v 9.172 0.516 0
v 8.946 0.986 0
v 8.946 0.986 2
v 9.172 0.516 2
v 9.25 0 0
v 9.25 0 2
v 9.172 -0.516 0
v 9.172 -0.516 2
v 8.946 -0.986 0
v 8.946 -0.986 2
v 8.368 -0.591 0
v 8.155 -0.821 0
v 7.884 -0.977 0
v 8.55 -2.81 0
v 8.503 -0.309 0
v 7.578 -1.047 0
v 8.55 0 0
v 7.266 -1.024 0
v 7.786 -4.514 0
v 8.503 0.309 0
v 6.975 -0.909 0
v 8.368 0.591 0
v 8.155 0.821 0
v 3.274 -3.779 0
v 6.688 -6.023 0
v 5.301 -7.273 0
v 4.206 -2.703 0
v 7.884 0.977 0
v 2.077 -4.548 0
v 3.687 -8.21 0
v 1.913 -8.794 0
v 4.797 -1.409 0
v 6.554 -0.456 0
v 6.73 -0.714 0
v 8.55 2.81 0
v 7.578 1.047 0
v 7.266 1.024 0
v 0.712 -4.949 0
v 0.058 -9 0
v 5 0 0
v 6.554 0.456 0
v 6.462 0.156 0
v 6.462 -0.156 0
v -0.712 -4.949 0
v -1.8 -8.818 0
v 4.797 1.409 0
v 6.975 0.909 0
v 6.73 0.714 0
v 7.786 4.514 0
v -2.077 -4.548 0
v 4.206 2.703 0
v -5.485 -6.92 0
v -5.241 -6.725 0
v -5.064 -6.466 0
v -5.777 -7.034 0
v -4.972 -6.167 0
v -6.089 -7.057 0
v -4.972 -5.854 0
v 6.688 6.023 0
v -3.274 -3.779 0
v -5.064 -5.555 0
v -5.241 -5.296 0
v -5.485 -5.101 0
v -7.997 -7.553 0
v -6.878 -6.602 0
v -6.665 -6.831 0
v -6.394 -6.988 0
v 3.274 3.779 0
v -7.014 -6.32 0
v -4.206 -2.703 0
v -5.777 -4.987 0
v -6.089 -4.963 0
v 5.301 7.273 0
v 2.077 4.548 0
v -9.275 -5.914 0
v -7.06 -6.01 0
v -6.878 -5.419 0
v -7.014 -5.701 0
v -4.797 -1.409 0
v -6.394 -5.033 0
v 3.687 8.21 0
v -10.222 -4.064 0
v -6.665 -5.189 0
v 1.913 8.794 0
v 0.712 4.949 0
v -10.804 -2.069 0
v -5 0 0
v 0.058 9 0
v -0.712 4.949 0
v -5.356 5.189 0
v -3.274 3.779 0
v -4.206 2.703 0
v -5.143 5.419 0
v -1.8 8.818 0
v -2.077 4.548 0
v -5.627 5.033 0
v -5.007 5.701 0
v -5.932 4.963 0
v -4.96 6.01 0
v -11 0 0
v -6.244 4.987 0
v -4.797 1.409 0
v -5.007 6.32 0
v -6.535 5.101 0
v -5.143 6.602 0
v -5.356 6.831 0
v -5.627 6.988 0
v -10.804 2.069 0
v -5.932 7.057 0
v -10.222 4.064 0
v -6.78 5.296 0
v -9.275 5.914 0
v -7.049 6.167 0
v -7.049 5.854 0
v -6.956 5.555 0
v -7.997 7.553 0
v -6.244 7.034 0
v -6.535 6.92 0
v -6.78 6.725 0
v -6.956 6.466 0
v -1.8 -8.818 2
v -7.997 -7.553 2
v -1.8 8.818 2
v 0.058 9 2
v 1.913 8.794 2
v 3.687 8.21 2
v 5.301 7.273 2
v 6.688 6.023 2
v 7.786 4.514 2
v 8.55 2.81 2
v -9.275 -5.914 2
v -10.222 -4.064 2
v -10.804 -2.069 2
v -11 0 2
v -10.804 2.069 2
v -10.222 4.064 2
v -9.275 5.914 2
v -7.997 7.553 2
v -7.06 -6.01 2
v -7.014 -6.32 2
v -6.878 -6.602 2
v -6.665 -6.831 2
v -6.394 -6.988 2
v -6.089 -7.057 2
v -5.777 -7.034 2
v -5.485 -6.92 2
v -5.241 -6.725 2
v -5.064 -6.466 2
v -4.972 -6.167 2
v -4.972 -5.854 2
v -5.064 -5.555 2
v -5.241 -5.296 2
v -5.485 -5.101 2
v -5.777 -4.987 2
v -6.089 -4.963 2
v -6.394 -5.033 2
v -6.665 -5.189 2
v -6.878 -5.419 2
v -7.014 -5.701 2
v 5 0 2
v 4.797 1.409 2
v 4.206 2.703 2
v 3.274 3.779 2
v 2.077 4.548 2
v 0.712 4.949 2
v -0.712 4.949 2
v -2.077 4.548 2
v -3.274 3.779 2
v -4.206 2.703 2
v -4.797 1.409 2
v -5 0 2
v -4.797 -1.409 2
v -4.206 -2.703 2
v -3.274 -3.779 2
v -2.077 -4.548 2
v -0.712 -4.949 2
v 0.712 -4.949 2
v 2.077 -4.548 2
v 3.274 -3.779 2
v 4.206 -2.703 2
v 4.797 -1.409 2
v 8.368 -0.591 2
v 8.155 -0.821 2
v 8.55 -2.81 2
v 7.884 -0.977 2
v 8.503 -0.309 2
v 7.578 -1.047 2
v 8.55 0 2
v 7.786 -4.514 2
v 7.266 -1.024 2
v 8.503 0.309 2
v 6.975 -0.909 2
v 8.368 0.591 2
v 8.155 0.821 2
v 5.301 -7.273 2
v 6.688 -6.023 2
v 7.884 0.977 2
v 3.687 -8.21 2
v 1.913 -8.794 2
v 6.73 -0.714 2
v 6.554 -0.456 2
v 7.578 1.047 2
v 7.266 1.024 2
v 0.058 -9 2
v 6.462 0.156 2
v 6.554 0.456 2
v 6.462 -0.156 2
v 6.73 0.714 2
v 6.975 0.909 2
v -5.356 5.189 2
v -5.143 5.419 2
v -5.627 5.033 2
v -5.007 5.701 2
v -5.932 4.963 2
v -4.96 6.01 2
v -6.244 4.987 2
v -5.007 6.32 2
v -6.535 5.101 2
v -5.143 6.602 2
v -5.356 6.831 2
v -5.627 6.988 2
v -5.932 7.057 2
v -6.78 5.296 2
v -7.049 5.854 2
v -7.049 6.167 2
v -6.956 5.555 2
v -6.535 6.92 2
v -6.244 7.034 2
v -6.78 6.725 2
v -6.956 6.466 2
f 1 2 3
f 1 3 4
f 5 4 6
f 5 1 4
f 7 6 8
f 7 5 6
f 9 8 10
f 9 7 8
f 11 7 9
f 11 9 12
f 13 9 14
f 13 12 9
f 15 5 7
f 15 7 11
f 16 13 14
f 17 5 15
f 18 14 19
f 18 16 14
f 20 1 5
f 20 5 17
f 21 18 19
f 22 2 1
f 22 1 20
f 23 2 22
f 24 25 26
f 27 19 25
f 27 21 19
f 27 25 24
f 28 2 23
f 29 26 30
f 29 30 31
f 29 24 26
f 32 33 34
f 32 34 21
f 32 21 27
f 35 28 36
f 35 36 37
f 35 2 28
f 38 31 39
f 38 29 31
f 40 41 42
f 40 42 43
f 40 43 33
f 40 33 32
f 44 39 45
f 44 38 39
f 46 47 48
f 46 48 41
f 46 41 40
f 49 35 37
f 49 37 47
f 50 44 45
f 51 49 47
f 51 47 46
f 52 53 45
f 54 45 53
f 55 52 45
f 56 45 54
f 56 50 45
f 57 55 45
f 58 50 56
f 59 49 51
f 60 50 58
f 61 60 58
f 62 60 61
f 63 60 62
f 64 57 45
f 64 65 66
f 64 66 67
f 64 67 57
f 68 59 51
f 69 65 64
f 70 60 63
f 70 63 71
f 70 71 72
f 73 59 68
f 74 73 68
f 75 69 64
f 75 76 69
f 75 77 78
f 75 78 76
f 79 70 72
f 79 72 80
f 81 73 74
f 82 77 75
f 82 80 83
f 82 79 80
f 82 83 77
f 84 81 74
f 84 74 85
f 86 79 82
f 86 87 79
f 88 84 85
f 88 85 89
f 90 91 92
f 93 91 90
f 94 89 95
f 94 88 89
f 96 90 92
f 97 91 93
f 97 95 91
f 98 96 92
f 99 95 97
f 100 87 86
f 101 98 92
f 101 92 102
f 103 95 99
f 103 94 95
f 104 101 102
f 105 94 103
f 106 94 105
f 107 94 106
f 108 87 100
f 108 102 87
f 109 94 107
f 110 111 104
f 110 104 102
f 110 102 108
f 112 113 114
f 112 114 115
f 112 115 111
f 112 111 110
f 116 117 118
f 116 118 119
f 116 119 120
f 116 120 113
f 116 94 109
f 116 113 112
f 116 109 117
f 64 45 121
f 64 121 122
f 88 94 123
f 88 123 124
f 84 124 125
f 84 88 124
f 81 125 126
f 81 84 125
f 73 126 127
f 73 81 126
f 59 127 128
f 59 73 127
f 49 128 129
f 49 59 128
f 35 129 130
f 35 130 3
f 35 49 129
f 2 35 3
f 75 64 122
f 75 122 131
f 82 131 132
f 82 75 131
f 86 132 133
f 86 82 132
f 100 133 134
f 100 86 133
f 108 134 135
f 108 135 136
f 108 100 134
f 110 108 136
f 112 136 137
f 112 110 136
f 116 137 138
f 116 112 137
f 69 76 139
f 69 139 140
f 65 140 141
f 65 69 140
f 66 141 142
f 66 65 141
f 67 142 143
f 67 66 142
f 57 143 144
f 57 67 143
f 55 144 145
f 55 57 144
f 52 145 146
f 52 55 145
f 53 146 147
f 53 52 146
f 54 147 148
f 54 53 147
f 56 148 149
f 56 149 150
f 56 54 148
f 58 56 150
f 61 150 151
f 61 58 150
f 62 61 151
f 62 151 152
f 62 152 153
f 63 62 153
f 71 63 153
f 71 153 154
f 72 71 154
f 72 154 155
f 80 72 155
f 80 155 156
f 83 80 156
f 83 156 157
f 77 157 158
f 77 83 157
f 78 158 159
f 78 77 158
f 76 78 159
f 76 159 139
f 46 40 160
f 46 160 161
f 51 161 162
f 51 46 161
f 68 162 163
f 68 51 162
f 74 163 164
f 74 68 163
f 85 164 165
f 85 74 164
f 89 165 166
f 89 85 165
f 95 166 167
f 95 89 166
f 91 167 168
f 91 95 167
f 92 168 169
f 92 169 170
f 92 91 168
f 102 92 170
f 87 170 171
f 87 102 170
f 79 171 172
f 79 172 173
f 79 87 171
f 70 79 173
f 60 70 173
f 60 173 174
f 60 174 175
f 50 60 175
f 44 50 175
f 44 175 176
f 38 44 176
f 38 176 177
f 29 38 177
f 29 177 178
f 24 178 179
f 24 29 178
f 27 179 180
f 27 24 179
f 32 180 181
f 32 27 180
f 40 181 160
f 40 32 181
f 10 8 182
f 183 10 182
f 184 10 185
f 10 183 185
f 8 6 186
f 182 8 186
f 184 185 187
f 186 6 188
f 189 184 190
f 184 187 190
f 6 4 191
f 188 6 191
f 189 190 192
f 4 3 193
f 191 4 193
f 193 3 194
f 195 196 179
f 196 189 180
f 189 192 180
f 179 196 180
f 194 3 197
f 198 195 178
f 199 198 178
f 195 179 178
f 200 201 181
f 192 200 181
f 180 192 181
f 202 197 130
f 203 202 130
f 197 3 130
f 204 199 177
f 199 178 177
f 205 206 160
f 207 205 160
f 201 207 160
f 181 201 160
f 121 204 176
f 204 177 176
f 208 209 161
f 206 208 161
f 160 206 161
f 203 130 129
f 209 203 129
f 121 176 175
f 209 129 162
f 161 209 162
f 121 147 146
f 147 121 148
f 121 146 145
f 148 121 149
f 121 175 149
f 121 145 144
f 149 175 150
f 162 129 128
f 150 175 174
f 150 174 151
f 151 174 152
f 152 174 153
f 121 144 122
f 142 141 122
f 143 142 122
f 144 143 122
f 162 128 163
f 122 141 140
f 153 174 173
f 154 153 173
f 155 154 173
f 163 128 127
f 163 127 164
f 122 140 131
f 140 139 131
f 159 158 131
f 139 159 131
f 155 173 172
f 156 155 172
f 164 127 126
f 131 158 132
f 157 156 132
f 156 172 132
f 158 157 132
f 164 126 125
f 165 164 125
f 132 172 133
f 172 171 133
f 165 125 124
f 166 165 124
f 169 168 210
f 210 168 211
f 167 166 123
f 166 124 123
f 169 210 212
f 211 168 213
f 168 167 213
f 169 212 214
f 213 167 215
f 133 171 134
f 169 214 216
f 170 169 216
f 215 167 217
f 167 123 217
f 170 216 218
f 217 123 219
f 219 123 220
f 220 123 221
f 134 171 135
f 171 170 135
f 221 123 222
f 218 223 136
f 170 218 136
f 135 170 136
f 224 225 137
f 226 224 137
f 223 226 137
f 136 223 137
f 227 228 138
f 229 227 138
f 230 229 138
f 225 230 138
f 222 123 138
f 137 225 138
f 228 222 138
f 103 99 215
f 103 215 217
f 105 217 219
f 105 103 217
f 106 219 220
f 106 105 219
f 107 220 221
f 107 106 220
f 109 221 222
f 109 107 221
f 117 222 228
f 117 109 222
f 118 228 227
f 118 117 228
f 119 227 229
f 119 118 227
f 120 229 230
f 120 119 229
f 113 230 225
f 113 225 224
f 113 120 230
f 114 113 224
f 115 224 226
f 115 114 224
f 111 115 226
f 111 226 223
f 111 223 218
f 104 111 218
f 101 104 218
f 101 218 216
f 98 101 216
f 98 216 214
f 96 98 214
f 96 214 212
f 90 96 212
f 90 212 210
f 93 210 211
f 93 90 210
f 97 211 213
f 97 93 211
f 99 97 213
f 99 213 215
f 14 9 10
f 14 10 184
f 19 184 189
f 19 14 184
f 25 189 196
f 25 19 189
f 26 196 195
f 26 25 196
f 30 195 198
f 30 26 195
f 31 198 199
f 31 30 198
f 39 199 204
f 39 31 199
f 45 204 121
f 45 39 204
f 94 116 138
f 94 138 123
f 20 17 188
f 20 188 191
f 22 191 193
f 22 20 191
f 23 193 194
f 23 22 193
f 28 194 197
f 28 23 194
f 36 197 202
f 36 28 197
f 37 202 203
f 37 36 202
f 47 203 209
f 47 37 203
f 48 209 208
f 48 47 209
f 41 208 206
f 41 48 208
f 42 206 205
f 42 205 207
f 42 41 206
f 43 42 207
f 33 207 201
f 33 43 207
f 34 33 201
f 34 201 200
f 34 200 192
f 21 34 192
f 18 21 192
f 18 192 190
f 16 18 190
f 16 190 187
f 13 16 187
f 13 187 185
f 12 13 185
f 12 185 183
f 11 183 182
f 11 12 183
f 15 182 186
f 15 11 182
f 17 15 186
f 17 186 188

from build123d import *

# Parameters (mm, degrees)
ESQUISSE1_R        = 5
ESQUISSE1_R_2      = 1.05
BOSS_EXTRU_1_DEPTH = 2


with BuildPart() as part:
    # Esquisse1 → Boss.-Extru.1 (new body)
    with BuildSketch(Plane.XY):
        with BuildLine():
            Line((-7.996773354, 7.55325201), (-1.8, 8.818163074))
            ThreePointArc((-1.8, 8.818163074), (5.30110237, 7.27312269), (8.945833333, 0.985934061))
            ThreePointArc((8.945833333, 0.985934061), (9.25, 0), (8.945833333, -0.985934061))
            ThreePointArc((8.945833333, -0.985934061), (5.30110237, -7.27312269), (-1.8, -8.818163074))
            Line((-1.8, -8.818163074), (-7.996773354, -7.55325201))
            ThreePointArc((-7.996773354, -7.55325201), (-11, 0), (-7.996773354, 7.55325201))
        make_face()
        Circle(ESQUISSE1_R, mode=Mode.SUBTRACT)
        with Locations((7.5, 0)):
            Circle(ESQUISSE1_R_2, mode=Mode.SUBTRACT)
        with Locations((-6.01040764, 6.01040764)):
            Circle(ESQUISSE1_R_2, mode=Mode.SUBTRACT)
        with Locations(Location((-6.01040764, -6.01040764, 0), (0, 0, 180))):
            Circle(ESQUISSE1_R_2, mode=Mode.SUBTRACT)
    extrude(amount=BOSS_EXTRU_1_DEPTH)


solid = part.part
